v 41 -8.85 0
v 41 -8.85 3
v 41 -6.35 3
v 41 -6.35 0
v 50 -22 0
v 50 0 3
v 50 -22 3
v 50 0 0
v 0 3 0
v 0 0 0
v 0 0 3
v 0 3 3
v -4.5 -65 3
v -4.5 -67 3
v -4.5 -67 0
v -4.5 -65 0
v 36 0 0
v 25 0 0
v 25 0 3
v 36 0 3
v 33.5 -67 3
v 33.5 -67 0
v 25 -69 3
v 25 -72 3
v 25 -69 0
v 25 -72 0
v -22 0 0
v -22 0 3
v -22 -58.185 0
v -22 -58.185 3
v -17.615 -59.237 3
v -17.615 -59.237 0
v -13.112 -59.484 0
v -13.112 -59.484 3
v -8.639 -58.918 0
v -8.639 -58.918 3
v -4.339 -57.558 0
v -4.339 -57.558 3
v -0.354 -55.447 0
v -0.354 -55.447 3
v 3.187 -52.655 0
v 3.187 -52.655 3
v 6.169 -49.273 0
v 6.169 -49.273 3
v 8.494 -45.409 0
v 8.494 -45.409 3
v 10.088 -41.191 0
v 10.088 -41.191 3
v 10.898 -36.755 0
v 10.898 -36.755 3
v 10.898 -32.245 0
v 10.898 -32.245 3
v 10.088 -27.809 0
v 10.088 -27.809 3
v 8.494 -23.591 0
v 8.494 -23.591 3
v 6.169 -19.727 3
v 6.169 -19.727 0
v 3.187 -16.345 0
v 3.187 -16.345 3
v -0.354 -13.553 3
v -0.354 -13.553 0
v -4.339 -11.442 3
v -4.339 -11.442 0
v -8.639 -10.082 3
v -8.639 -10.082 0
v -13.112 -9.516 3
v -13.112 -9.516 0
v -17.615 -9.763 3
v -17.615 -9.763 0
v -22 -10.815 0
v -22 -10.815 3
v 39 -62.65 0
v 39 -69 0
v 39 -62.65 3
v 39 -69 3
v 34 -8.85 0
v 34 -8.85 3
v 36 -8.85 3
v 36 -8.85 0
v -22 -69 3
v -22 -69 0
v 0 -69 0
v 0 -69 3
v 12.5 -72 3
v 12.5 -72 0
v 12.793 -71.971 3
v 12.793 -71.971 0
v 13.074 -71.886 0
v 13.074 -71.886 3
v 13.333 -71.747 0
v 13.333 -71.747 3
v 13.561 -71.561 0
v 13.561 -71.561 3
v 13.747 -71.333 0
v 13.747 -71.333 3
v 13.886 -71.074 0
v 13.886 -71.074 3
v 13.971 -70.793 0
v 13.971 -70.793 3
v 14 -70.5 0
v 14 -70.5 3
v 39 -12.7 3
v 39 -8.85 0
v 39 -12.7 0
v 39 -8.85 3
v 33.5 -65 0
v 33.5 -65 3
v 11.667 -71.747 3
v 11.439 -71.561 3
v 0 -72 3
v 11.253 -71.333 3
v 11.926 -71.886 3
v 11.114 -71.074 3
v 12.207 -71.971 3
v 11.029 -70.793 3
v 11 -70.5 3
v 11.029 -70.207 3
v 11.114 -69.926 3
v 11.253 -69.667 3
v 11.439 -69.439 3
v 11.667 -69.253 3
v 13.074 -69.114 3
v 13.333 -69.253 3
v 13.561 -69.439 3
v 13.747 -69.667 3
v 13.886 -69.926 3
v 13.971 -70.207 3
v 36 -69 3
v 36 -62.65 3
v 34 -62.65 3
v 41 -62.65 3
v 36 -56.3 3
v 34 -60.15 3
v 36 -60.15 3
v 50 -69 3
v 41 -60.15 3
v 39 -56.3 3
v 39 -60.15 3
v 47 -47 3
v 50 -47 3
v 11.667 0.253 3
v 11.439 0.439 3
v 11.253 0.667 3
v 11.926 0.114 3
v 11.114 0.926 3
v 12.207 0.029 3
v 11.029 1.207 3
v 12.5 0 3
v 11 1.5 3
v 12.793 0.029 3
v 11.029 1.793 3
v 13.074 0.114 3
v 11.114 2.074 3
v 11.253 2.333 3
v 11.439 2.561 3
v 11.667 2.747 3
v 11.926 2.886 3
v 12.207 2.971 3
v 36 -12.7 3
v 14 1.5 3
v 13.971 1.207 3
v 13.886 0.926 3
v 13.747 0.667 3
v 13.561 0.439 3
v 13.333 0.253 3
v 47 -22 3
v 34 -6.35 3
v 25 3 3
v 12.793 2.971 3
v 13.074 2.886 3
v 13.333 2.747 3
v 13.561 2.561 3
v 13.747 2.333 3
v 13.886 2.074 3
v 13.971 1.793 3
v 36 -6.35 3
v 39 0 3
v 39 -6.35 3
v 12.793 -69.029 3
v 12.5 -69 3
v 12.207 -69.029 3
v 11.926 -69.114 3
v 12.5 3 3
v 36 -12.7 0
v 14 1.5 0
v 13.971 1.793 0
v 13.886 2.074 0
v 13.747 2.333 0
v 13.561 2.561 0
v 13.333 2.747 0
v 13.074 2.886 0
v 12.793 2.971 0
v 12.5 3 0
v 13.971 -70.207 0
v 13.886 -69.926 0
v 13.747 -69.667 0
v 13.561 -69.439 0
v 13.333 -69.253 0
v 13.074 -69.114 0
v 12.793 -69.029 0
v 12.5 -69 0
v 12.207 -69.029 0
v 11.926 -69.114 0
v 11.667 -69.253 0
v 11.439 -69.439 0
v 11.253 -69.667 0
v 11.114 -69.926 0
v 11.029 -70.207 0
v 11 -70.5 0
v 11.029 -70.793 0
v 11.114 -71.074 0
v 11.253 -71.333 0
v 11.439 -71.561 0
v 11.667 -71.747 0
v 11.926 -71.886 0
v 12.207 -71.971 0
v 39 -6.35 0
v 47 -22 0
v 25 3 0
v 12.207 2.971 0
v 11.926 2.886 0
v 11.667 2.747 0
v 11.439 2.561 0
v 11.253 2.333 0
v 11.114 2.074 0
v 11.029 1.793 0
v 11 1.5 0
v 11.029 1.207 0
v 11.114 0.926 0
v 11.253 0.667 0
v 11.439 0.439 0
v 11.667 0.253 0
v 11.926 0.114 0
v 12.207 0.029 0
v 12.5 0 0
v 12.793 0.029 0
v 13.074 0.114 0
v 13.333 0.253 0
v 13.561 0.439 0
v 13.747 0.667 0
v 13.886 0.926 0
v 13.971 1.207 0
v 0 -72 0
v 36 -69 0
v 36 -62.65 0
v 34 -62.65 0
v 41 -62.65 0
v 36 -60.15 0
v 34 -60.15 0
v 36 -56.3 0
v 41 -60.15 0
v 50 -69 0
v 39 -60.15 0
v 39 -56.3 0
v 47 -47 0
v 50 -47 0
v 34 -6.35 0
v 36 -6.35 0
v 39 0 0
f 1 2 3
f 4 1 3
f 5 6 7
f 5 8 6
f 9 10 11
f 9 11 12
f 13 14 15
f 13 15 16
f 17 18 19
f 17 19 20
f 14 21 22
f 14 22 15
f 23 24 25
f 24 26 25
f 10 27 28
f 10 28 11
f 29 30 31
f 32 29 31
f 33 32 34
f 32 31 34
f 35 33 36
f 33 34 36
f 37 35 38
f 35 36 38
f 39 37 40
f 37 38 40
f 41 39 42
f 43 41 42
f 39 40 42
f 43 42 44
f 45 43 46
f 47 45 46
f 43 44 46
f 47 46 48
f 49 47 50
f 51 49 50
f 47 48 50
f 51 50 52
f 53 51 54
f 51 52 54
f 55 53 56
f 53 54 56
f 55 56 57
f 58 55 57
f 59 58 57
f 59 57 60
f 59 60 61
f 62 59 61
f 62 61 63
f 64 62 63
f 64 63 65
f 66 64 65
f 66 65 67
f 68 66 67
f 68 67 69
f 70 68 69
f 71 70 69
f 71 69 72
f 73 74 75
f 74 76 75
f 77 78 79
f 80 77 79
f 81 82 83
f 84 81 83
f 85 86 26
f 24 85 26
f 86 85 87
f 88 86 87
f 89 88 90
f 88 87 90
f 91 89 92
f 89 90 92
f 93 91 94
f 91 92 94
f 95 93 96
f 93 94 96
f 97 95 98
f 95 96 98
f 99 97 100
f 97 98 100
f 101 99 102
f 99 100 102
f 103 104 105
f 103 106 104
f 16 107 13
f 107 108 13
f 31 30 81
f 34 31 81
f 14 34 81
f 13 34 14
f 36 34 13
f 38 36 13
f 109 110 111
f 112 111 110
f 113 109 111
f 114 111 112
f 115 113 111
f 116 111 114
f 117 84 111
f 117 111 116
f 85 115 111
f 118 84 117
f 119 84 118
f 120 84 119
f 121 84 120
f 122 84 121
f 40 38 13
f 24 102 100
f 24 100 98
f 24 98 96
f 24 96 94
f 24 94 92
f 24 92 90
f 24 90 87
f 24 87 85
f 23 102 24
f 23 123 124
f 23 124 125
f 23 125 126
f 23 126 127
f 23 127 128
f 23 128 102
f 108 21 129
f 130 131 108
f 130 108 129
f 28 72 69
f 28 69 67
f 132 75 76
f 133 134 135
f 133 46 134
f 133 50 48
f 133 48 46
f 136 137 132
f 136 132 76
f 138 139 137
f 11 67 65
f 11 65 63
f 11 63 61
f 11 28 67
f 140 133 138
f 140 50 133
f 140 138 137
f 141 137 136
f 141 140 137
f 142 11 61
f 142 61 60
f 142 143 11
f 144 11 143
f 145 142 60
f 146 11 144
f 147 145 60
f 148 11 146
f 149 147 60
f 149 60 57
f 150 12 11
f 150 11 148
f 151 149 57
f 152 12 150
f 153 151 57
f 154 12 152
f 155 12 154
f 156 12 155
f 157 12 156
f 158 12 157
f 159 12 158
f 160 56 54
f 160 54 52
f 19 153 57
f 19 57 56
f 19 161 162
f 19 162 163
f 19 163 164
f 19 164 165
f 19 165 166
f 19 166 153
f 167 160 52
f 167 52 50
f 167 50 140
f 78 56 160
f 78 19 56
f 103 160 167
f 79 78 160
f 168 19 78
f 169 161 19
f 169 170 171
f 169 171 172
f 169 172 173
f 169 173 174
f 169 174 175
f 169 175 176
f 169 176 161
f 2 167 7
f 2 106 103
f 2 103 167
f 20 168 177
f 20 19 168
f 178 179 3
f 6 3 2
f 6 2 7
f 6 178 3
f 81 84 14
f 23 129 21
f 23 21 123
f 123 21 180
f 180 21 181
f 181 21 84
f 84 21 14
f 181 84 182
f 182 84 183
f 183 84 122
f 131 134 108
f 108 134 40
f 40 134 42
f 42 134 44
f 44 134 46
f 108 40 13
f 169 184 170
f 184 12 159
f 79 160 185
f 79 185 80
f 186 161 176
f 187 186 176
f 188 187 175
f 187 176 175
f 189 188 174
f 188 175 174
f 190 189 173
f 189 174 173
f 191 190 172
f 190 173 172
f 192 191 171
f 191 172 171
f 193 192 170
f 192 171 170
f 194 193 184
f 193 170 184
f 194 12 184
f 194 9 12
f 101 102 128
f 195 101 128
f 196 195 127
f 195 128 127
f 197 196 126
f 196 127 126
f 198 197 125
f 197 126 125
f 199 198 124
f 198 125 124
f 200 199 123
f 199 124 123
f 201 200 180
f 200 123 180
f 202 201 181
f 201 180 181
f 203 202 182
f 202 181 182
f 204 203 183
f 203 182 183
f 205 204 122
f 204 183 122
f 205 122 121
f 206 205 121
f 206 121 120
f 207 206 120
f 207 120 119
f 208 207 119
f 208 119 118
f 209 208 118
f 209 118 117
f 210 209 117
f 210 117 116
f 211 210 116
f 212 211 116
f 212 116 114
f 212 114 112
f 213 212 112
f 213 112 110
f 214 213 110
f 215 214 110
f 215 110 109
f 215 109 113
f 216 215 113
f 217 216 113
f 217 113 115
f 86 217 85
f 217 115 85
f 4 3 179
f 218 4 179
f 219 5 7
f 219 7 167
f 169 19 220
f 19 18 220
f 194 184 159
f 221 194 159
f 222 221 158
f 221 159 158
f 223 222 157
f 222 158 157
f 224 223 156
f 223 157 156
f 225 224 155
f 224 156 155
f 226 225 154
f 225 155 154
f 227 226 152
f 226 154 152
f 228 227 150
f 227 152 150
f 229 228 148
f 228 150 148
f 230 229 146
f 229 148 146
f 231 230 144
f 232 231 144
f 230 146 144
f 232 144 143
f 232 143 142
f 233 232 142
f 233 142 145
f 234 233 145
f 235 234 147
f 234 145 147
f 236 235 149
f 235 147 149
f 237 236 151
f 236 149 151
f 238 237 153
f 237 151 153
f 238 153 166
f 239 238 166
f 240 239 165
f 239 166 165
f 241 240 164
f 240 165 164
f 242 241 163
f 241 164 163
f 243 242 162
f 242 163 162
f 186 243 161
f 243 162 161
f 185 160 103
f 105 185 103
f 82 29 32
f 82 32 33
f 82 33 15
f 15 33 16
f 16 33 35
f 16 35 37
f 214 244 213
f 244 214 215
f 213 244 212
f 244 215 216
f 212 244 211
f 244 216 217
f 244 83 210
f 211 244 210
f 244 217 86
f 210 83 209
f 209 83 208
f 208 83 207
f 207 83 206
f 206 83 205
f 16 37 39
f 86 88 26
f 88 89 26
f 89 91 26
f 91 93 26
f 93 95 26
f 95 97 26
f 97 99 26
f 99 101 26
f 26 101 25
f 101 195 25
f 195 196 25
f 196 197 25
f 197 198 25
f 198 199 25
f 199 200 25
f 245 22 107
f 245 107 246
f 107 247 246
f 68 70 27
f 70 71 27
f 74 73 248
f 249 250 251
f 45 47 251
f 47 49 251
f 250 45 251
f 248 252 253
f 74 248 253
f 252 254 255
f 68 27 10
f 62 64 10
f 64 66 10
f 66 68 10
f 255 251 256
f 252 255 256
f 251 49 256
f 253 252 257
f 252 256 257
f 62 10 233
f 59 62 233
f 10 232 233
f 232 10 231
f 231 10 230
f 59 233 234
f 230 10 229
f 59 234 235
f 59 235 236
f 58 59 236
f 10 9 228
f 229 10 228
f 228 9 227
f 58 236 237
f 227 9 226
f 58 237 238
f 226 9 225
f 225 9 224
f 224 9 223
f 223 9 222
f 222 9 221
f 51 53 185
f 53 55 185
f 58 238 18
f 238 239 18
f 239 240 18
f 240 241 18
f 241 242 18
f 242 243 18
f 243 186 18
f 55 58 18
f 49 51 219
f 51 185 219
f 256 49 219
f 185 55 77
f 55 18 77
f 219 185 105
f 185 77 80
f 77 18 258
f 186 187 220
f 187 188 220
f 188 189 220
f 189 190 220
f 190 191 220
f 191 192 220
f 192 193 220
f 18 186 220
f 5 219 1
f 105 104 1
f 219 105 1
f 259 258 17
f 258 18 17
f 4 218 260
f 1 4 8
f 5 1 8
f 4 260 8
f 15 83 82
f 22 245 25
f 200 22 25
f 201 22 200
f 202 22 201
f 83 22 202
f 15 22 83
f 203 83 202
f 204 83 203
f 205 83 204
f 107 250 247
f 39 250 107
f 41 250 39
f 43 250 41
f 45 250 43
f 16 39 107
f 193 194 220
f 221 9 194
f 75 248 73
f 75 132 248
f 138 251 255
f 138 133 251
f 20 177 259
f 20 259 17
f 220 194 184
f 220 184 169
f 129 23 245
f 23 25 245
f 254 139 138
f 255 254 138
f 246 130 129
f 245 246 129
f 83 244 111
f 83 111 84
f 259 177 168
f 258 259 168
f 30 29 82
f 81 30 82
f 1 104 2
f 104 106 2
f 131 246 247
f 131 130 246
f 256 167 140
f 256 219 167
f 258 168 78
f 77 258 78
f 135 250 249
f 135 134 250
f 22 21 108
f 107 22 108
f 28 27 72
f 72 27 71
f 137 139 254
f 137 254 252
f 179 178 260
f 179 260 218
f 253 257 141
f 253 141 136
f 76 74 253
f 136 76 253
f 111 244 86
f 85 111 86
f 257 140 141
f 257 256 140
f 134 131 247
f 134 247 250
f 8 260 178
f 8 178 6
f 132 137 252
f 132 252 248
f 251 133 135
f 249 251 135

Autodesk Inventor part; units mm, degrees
ref_plane "YZ Plane" through (0, 0, 0) normal (1, 0, 0) x (0, 1, 0)
ref_plane "XZ Plane" through (0, 0, 0) normal (0, 1, 0) x (-1, 0, 0)
ref_plane "XY Plane" through (0, 0, 0) normal (0, 0, 1) x (1, 0, 0)
sketch "Sketch1" plane through (0, 0, 0) normal (0, 0, 1) x (1, 0, 0)
  line L0 (0, 0) -> (25, 0) projected
  line L1 (25, 0) -> (25, 3) projected
  line L2 (0, 3) -> (25, 3) projected
  line L3 (0, 0) -> (0, 3) projected
  line L4 (0.2071, -72) -> (11, -72) projected
  line L5 (0.2071, -69) -> (11, -69) projected
  line L6 (25, -69) -> (50, -69) projected
  line L7 (25, 0) -> (50, 0) projected
  line L8 (-25, 0) -> (0, 0) projected
  line L9 (-22, 0) -> (-22, -10.8146) projected
  line L10 (-25, -22) -> (-25, -47) projected
  line L11 (-25, -47) -> (-22, -47) projected
  line L12 (-22, -10.8146) -> (-22, -58.1854) projected
  line L13 (-25, -22) -> (-22, -22) projected
  line L14 (-22, -58.1854) -> (-22, -69) projected
  line L15 (-25, -69) -> (0, -69) projected
  line L16 (50, 0) -> (50, -22)
  line L17 (50, -22) -> (47, -22)
  line L18 (47, -22) -> (47, -47)
  line L19 (47, -47) -> (50, -47)
  line L20 (50, -47) -> (50, -69)
  line L21 (50, 0) -> (25, 0)
  line L22 (25, 3) -> (25, 0)
  line L23 (25, 3) -> (0, 3)
  line L24 (0, 3) -> (0, 0)
  line L25 (-22, -10.8146) -> (-22, 0)
  line L26 (-22, 0) -> (0, 0)
  line L27 (-22, -22) -> (-25, -22)
  line L28 (-25, -22) -> (-25, -47)
  line L29 (-22, -47) -> (-25, -47)
  line L30 (-22, -58.1854) -> (-22, -69)
  line L31 (-22, -69) -> (0, -69)
  line L32 (0, -72) -> (0, -69)
  line L33 (0, -72) -> (25, -72)
  line L34 (25, -72) -> (25, -69)
  line L35 (25, -69) -> (50, -69)
  line L36 (11, -72) -> (11, -69) projected
  line L37 (0.2071, -69) -> (0.2071, -72) projected
  dimension "d0" = 3
extrude "Extrusion1" add sketch "Sketch1" along normal blind 3
sketch "Sketch2" plane through (0, 0, 3) normal (0, 0, 1) x (1, 0, 0)
  line L0 (-25, -22) -> (-25, -47) projected
  line L1 (-25, -34.5) -> (7, -34.5)
  line L2 (-25, -34.5) -> (-14, -34.5)
  circle A0 centre (-14, -34.5) radius 21
  circle A1 centre (-14, -34.5) radius 25
  point P0 (0, 0)
  dimension "d3" = 32
  dimension "d4" = 11
  dimension "d5" = 4
extrude "Extrusion2" cut sketch "Sketch2" against normal blind 20 contours A0 | A1
sketch "Sketch3" plane through (0, 0, 3) normal (0, 0, 1) x (1, 0, 0)
  line L0 (-1.2929, -65) -> (30.2929, -65) projected
  line L1 (-4.5, -67) -> (-4.5, -65) projected
  line L2 (33.5, -67) -> (33.5, -65) projected
  line L3 (30.6464, -65) -> (33.5, -65) projected
  line L4 (30.6464, -65) -> (30.2929, -65) projected
  line L5 (30.2929, -67) -> (30.6464, -67) projected
  line L6 (33.5, -67) -> (30.6464, -67) projected
  line L7 (30.2929, -67) -> (-1.2929, -67) projected
  arc A0 (-22, -58.1854) -> (-22, -10.8146) centre (-14, -34.5) ccw projected
  line L8 (-22, -58.1854) -> (-22, -69) projected
  line L9 (-22, -69) -> (0, -69) projected
  line L10 (0, -69) -> (0, -72) projected
  line L11 (50, -69) -> (50, -47) projected
  line L12 (50, -47) -> (47, -47) projected
  line L13 (47, -47) -> (47, -22) projected
  line L14 (47, -22) -> (50, -22) projected
  line L15 (50, -22) -> (50, 0) projected
  line L16 (50, 0) -> (25, 0) projected
  line L17 (25, 0) -> (25, 3) projected
  line L18 (25, 3) -> (0, 3) projected
  line L19 (0, 3) -> (0, 0) projected
  line L20 (0, 0) -> (-22, 0) projected
  line L21 (-22, 0) -> (-22, -10.8146) projected
  line L22 (-4.5, -65) -> (-1.6464, -65) projected
  line L23 (-1.2929, -65) -> (-1.6464, -65) projected
  line L24 (-1.6464, -67) -> (-4.5, -67) projected
  line L25 (-1.6464, -67) -> (-1.2929, -67) projected
  line L26 (0, -72) -> (25, -72) projected
  line L27 (25, -69) -> (50, -69) projected
  line L28 (25, -72) -> (25, -69) projected
extrude "Extrusion3" cut sketch "Sketch3" against normal blind 3 contours L0 L4 L3 L2 L6 L5 L7 L25 L24 L1 L22 L23
sketch "Sketch4" plane through (0, 0, 3) normal (0, 0, 1) x (1, 0, 0)
  line L0 (47, -47) -> (47, -22) projected
  line L1 (47, -34.5) -> (34.3, -34.5)
  line L2 (34.3, -34.5) -> (34.3, -36)
  line L3 (34.3, -36) -> (34.3, -33)
  line L4 (34.3, -33) -> (47, -33)
  line L5 (47, -33) -> (47, -36)
  line L6 (47, -36) -> (34.3, -36)
  line L7 (40.65, -36) -> (40.65, -38)
  line L8 (40.65, -38) -> (38.15, -38)
  line L9 (38.15, -38) -> (38.15, -31)
  line L10 (38.15, -31) -> (40.65, -31)
  line L11 (40.65, -31) -> (40.65, -36)
  line L12 (25, 3) -> (0, 3) projected
  line L13 (50, 0) -> (25, 0) projected
  line L14 (0, 0) -> (-22, 0) projected
  line L15 (25, -69) -> (50, -69) projected
  line L16 (0, -72) -> (25, -72) projected
  line L17 (-22, -69) -> (0, -69) projected
  line L18 (50, 0) -> (25, 0) projected
  line L19 (37.5, 0) -> (37.5, -12.7)
  line L20 (37.5, -12.7) -> (39, -12.7)
  line L21 (39, -12.7) -> (36, -12.7)
  line L22 (36, -12.7) -> (36, 0)
  line L23 (39, 0) -> (39, -12.7)
  line L24 (36, -6.35) -> (34, -6.35)
  line L25 (34, -6.35) -> (34, -8.85)
  line L26 (34, -8.85) -> (41, -8.85)
  line L27 (41, -8.85) -> (41, -6.35)
  line L28 (41, -6.35) -> (36, -6.35)
  line L29 (50, -69) -> (25, -69)
  line L30 (37.5, -69) -> (37.5, -56.3)
  line L31 (37.5, -56.3) -> (39, -56.3)
  line L32 (39, -56.3) -> (36, -56.3)
  line L33 (36, -56.3) -> (36, -69)
  line L34 (39, -69) -> (39, -56.3)
  line L35 (36, -62.65) -> (34, -62.65)
  line L36 (34, -62.65) -> (34, -60.15)
  line L37 (34, -60.15) -> (41, -60.15)
  line L38 (41, -60.15) -> (41, -62.65)
  line L39 (41, -62.65) -> (36, -62.65)
  line L40 (-4.5, -65) -> (33.5, -65) projected
  line L41 (33.5, -65) -> (33.5, -67) projected
  line L42 (33.5, -67) -> (-4.5, -67) projected
  line L43 (-4.5, -67) -> (-4.5, -65) projected
  arc A0 (-22, -58.1854) -> (-22, -10.8146) centre (-14, -34.5) ccw projected
  line L44 (-22, -58.1854) -> (-22, -69) projected
  line L45 (-22, -69) -> (0, -69) projected
  line L46 (0, -69) -> (0, -72) projected
  line L47 (0, -72) -> (25, -72) projected
  line L48 (25, -69) -> (50, -69) projected
  line L49 (50, -69) -> (50, -47) projected
  line L50 (50, -47) -> (47, -47) projected
  line L51 (47, -47) -> (47, -22) projected
  line L52 (47, -22) -> (50, -22) projected
  line L53 (50, -22) -> (50, 0) projected
  line L54 (50, 0) -> (25, 0) projected
  line L55 (25, 0) -> (25, 3) projected
  line L56 (25, 3) -> (0, 3) projected
  line L57 (0, 3) -> (0, 0) projected
  line L58 (0, 0) -> (-22, 0) projected
  line L59 (-22, 0) -> (-22, -10.8146) projected
  circle A1 centre (12.5, 1.5) radius 1.5
  line L60 (39, -56.3) -> (36, -56.3)
  line L61 (36, -56.3) -> (36, -69)
  line L62 (36, -69) -> (39, -69)
  line L63 (39, -69) -> (39, -56.3)
  circle A2 centre (12.5, -70.5) radius 1.5
  line L64 (25, -72) -> (25, -69) projected
  arc A3 (42.9741, -36.0257) -> (30.0259, -20.7829) centre (36.5, -28.4043) ccw projected
  line L65 (26.9692, -49.6214) -> (42.9741, -36.0257) projected
  arc A4 (14.0209, -34.3786) -> (26.9692, -49.6214) centre (20.4951, -42) ccw projected
  line L66 (30.0259, -20.7829) -> (14.0209, -34.3786) projected
  dimension "d10" = 12.7
  dimension "d11" = 1.5
  dimension "d12" = 3
  dimension "d13" = 2
  dimension "d14" = 2.5
  dimension "d15" = 7
  dimension "d16" = 12.7
  dimension "d17" = 1.5
  dimension "d18" = 3
  dimension "d19" = 2
  dimension "d20" = 2.5
  dimension "d21" = 7
  dimension "d22" = 3
  dimension "d25" = 3
extrude "Extrusion4" cut sketch "Sketch4" against normal blind 25.4 contours A1 | A2 | L15 L30 L39 L34 | L15 L33 L39 L30 | L39 L30 L37 L34 | L34 L37 L38 L39 | L39 L33 L37 L30 | L37 L30 L31 L34 | L35 L36 L37 L33 | L37 L33 L32 L30 | L23 L28 L19 L13 | L19 L28 L22 L13 | L28 L27 L26 L23 | L23 L26 L19 L28 | L19 L26 L22 L28 | L23 L20 L19 L26 | L22 L26 L25 L24 | L19 L21 L22 L26
properties part number "pared frontal 2"
